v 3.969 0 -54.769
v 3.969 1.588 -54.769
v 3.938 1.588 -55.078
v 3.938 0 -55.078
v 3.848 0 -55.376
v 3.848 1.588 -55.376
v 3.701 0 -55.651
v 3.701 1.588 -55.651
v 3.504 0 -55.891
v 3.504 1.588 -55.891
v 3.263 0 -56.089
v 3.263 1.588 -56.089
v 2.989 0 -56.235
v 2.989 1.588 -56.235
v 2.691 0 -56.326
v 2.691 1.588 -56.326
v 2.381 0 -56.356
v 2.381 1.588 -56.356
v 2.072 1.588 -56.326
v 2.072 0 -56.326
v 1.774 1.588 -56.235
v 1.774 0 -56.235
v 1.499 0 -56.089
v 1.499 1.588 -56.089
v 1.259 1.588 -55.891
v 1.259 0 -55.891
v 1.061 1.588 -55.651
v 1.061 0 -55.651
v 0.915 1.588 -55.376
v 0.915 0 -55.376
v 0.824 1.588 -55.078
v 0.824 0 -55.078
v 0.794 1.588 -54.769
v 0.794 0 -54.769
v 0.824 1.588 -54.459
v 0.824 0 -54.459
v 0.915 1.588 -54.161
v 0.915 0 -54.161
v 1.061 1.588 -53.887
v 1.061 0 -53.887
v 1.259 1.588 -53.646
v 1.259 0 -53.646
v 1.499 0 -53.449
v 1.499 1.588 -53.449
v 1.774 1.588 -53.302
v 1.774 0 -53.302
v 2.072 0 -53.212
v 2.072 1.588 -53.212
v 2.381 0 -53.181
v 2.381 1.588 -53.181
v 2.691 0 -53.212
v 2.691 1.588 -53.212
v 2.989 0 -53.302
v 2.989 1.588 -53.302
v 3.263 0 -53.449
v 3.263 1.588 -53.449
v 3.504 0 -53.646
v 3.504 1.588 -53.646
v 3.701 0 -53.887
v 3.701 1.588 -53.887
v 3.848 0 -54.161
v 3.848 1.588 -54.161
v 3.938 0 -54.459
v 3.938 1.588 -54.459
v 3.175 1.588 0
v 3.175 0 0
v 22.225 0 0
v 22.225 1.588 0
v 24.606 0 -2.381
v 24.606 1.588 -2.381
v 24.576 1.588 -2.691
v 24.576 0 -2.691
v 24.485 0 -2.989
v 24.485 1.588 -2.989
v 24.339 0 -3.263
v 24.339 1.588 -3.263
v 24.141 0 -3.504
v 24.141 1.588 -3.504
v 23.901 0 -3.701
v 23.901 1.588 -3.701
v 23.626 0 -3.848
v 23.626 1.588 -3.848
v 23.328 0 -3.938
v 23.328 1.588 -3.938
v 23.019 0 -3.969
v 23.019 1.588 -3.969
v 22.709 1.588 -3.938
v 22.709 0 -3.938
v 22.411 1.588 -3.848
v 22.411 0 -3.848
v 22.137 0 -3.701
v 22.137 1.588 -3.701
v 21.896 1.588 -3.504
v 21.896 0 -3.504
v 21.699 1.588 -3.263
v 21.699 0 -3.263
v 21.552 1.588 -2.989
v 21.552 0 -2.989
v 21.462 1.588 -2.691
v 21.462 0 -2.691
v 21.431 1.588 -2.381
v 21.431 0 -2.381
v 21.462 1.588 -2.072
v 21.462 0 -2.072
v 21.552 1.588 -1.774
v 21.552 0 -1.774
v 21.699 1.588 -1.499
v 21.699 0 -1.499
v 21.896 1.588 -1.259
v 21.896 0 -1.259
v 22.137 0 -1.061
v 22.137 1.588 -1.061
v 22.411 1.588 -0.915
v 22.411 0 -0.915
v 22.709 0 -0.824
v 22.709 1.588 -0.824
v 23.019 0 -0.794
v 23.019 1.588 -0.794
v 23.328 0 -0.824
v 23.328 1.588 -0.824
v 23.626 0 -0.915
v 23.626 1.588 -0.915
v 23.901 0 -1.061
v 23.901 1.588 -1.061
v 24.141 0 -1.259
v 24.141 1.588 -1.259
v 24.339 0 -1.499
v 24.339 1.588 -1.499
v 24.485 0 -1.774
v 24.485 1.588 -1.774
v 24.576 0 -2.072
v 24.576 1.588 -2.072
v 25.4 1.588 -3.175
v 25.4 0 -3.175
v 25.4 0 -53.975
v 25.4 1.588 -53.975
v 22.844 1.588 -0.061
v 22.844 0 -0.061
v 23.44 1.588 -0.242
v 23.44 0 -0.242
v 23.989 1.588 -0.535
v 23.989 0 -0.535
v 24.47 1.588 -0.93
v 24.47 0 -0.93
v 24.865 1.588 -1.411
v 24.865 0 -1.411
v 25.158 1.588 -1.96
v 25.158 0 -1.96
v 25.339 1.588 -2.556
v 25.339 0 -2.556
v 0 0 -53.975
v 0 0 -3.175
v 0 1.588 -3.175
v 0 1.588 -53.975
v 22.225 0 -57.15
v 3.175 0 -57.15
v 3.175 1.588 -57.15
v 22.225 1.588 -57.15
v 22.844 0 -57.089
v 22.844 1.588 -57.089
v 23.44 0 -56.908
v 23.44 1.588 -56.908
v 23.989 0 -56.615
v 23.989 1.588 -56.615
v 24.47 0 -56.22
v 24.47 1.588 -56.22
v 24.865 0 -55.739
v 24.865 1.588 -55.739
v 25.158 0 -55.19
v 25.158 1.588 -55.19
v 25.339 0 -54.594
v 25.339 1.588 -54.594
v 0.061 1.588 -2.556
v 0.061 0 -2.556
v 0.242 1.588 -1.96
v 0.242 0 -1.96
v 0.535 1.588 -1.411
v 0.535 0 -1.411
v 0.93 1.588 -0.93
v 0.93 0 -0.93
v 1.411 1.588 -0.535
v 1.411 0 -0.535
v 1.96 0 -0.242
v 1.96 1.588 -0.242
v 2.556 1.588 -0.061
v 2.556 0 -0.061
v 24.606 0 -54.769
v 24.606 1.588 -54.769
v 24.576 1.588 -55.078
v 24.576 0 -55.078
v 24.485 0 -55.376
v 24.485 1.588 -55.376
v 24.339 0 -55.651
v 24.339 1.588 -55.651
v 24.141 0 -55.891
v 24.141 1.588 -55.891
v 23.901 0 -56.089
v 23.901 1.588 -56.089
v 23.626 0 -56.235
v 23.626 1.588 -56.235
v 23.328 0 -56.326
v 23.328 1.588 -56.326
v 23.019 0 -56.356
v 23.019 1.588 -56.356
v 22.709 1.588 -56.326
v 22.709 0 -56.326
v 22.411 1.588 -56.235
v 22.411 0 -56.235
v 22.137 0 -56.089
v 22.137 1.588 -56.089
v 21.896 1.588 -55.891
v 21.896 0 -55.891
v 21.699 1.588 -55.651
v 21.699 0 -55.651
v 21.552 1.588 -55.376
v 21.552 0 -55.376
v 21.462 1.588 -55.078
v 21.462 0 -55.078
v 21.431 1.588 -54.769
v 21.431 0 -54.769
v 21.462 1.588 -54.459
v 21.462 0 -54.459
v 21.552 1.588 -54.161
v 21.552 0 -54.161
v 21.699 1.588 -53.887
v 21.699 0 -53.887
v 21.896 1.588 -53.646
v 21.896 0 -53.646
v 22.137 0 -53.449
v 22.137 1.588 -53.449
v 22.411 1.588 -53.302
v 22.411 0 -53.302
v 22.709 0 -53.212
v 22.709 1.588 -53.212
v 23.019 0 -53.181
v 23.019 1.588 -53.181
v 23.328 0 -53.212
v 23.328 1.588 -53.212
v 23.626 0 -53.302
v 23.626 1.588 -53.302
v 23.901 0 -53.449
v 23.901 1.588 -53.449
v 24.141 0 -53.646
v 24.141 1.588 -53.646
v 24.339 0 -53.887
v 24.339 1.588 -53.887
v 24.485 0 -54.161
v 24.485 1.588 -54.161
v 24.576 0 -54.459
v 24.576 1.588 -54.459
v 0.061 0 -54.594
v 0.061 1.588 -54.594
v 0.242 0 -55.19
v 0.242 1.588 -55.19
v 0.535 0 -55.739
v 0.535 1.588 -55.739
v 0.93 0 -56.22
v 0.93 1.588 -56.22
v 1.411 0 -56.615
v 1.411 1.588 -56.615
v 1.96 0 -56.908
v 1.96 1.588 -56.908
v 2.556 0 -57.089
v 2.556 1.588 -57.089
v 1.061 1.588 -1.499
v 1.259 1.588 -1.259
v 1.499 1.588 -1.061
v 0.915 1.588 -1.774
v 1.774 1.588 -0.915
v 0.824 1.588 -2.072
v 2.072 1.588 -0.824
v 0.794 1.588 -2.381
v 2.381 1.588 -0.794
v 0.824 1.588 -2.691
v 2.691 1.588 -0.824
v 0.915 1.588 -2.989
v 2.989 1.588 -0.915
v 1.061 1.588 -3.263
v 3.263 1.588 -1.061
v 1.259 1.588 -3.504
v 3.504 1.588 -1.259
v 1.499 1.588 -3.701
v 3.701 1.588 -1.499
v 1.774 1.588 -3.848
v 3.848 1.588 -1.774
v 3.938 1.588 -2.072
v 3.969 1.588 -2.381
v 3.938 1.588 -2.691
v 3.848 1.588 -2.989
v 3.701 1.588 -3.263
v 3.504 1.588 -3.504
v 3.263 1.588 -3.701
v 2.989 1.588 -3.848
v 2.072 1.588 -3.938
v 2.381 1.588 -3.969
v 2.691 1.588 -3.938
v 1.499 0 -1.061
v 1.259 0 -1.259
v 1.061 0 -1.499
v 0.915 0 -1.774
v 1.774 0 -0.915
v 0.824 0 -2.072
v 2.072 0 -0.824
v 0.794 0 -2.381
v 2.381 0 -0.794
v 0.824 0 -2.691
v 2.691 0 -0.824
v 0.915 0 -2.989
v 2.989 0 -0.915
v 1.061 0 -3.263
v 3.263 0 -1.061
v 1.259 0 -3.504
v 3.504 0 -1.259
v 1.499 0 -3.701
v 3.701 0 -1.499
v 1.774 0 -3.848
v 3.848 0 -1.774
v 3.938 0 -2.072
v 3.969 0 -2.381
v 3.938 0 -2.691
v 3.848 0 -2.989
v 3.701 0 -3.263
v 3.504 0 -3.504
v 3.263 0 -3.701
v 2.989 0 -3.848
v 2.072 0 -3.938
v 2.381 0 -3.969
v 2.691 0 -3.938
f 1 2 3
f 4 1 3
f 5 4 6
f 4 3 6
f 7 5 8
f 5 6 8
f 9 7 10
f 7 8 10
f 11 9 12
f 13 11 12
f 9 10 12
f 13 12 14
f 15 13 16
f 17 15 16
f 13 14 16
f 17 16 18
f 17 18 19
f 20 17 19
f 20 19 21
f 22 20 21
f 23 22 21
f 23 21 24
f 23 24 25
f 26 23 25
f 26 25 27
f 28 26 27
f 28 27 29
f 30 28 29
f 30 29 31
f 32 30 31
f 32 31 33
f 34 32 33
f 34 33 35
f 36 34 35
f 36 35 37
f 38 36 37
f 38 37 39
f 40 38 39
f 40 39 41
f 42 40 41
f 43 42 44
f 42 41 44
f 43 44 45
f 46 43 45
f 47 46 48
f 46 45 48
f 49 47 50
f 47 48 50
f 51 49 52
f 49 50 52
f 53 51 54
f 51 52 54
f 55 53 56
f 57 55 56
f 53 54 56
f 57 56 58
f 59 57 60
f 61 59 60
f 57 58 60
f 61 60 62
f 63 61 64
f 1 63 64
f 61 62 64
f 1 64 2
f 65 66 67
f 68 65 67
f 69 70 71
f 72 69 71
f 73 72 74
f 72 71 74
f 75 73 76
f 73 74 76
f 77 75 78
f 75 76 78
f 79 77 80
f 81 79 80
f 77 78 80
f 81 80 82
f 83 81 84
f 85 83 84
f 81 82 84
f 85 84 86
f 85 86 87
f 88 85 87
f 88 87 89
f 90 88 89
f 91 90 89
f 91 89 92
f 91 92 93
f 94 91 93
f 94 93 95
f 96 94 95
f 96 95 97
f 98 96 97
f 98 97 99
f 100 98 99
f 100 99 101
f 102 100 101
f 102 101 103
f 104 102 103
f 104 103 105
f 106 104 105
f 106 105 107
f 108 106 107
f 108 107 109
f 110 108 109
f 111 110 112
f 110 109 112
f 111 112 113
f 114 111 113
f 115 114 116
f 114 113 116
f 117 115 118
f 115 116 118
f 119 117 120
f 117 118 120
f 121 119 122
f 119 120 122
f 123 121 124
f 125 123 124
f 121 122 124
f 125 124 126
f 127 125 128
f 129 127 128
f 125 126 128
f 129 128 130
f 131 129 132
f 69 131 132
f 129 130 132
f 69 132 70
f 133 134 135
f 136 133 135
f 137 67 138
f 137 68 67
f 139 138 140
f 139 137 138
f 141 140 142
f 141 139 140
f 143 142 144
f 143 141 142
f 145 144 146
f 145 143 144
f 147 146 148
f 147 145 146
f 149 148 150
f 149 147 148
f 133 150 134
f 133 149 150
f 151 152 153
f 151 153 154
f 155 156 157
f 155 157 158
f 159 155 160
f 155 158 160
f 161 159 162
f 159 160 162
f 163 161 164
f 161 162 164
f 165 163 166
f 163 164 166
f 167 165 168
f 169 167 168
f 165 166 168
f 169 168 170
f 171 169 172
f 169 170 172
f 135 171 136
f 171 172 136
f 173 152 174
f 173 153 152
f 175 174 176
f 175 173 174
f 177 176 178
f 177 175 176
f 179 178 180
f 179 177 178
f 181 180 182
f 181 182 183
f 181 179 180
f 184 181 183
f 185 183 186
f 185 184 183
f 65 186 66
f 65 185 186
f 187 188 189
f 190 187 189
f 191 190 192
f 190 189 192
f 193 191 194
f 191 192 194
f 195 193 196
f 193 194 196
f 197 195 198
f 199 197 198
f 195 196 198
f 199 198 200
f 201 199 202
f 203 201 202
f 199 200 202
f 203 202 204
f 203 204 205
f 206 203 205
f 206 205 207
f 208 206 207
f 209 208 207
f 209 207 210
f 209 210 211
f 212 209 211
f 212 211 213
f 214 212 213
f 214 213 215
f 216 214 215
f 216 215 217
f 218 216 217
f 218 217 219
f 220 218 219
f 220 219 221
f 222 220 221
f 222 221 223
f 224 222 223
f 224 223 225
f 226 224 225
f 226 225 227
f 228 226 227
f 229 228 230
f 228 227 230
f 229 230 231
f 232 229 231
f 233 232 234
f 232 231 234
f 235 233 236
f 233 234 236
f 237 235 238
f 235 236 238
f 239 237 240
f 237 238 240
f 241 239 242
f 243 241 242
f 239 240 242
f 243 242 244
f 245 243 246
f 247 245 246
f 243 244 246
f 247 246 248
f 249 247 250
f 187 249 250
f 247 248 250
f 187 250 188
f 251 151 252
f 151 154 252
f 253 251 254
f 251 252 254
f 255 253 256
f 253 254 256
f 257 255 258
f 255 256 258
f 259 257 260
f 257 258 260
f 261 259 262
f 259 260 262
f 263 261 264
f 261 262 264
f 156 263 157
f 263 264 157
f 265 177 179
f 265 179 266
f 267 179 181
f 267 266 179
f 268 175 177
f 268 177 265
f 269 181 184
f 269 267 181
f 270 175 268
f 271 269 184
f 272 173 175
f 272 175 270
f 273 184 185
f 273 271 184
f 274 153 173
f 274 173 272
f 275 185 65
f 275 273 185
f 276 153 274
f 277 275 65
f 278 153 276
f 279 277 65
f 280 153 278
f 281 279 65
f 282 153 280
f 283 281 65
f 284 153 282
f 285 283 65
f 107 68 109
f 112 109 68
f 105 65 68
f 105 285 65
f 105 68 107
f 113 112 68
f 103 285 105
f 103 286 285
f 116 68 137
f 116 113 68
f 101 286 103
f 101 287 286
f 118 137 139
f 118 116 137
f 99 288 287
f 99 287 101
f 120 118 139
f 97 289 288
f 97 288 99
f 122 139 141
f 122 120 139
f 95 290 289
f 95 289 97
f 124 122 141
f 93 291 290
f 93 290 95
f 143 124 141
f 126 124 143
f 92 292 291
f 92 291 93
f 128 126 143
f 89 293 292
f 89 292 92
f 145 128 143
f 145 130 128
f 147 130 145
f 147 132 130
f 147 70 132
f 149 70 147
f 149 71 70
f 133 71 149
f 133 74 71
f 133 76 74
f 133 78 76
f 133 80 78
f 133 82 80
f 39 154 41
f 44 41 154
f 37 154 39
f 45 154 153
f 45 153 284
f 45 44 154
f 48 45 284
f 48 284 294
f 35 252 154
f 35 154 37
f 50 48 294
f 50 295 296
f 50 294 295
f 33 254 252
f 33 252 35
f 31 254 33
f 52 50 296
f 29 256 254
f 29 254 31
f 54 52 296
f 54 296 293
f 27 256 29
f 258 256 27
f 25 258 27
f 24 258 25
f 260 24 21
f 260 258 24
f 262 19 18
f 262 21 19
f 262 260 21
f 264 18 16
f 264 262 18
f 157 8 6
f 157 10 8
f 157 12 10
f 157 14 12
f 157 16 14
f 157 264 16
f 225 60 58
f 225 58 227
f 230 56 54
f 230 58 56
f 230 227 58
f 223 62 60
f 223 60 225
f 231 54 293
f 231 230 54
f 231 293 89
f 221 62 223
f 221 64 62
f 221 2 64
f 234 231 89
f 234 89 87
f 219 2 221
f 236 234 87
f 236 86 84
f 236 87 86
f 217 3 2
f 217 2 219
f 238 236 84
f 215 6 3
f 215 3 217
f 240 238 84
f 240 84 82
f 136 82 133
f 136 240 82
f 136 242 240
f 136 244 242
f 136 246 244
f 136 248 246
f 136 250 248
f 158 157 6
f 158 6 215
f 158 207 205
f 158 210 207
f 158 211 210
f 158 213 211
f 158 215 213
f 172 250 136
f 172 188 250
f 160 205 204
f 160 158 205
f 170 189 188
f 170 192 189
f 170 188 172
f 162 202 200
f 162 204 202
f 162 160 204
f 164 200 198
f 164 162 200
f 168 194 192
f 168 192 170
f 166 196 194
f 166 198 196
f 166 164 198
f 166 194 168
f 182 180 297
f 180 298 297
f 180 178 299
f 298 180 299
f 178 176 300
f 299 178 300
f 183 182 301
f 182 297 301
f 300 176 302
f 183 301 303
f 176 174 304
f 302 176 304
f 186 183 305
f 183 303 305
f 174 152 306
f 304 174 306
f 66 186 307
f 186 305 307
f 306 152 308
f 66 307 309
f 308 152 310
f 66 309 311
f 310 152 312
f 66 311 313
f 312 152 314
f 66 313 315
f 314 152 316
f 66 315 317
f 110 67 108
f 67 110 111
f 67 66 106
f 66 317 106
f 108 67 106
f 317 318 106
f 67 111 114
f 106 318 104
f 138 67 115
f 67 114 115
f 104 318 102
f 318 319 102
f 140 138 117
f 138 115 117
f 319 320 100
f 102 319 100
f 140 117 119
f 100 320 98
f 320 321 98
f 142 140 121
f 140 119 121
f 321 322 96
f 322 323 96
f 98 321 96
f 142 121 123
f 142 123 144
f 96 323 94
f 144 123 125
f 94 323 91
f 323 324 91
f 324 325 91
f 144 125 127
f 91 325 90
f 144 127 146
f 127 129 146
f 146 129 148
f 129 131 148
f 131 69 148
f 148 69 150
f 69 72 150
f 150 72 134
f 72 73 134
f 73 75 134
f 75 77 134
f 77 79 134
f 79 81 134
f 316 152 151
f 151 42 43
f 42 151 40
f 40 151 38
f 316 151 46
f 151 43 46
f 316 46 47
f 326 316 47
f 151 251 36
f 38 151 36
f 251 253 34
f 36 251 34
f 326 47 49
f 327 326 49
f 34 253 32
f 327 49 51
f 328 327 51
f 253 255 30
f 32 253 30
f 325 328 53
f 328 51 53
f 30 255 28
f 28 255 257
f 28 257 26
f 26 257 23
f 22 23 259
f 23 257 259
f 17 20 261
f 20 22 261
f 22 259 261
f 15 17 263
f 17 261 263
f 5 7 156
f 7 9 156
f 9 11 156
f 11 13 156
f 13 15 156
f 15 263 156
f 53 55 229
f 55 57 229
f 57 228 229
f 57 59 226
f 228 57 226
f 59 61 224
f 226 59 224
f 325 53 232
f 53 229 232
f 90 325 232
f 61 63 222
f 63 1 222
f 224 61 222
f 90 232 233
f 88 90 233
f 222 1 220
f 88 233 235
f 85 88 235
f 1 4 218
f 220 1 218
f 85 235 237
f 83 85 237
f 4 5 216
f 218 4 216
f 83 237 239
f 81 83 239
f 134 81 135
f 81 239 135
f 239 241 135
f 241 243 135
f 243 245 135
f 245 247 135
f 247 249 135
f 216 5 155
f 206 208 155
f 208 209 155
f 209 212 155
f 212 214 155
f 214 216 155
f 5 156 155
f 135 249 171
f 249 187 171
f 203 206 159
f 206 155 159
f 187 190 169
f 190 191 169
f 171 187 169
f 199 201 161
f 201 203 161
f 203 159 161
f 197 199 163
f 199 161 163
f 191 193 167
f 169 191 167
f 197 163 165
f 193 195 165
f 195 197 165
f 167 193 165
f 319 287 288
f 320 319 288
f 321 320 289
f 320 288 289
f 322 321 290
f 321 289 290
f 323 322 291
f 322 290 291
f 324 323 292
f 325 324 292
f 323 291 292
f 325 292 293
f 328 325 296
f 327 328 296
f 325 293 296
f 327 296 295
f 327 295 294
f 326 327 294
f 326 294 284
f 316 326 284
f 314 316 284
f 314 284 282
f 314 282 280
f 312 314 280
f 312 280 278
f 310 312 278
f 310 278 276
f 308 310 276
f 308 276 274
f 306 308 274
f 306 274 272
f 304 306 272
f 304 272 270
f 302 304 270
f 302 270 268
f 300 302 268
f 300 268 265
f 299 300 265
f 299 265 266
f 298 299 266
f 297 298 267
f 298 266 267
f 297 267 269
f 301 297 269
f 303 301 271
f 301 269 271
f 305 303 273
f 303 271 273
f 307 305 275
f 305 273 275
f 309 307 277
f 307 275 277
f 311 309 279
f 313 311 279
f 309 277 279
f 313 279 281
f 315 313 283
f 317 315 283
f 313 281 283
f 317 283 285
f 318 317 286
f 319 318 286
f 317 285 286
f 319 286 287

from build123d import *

# Parameters (mm, degrees)
SKETCH1_W           = 25.4
SKETCH1_H           = 57.15
BOSS_EXTRUDE1_DEPTH = 1.5875
SKETCH2_R           = 1.5875
CUT_EXTRUDE2_DEPTH  = 2.5875
FILLET1_R           = 3.175


with BuildPart() as part:
    # Sketch1 → Boss-Extrude1 (new body)
    with BuildSketch(Plane(origin=(0, 0, 0), x_dir=(1, 0, 0), z_dir=(0, 1, 0))):
        with Locations((12.7, 28.575)):
            Rectangle(SKETCH1_W, SKETCH1_H)
    extrude(amount=BOSS_EXTRUDE1_DEPTH)

    # Sketch2 → Cut-Extrude2 (cut, through all)
    with BuildSketch(Plane(origin=(0, 1.5875, 0), x_dir=(1, 0, 0), z_dir=(0, 1, 0))):
        with Locations((2.38125, 54.76875)):
            Circle(SKETCH2_R)
        with Locations((23.01875, 54.76875)):
            Circle(SKETCH2_R)
        with Locations((23.01875, 2.38125)):
            Circle(SKETCH2_R)
        with Locations((2.38125, 2.38125)):
            Circle(SKETCH2_R)
    extrude(amount=-CUT_EXTRUDE2_DEPTH, mode=Mode.SUBTRACT)

    # Fillet1
    fillet1_edges = [part.edges().sort_by_distance(p)[0] for p in [
        (0, 0.79375, -57.15),
        (25.4, 0.79375, -57.15),
        (25.4, 0.79375, 0),
        (0, 0.79375, 0),
    ]]
    fillet(fillet1_edges, radius=FILLET1_R)


solid = part.part
